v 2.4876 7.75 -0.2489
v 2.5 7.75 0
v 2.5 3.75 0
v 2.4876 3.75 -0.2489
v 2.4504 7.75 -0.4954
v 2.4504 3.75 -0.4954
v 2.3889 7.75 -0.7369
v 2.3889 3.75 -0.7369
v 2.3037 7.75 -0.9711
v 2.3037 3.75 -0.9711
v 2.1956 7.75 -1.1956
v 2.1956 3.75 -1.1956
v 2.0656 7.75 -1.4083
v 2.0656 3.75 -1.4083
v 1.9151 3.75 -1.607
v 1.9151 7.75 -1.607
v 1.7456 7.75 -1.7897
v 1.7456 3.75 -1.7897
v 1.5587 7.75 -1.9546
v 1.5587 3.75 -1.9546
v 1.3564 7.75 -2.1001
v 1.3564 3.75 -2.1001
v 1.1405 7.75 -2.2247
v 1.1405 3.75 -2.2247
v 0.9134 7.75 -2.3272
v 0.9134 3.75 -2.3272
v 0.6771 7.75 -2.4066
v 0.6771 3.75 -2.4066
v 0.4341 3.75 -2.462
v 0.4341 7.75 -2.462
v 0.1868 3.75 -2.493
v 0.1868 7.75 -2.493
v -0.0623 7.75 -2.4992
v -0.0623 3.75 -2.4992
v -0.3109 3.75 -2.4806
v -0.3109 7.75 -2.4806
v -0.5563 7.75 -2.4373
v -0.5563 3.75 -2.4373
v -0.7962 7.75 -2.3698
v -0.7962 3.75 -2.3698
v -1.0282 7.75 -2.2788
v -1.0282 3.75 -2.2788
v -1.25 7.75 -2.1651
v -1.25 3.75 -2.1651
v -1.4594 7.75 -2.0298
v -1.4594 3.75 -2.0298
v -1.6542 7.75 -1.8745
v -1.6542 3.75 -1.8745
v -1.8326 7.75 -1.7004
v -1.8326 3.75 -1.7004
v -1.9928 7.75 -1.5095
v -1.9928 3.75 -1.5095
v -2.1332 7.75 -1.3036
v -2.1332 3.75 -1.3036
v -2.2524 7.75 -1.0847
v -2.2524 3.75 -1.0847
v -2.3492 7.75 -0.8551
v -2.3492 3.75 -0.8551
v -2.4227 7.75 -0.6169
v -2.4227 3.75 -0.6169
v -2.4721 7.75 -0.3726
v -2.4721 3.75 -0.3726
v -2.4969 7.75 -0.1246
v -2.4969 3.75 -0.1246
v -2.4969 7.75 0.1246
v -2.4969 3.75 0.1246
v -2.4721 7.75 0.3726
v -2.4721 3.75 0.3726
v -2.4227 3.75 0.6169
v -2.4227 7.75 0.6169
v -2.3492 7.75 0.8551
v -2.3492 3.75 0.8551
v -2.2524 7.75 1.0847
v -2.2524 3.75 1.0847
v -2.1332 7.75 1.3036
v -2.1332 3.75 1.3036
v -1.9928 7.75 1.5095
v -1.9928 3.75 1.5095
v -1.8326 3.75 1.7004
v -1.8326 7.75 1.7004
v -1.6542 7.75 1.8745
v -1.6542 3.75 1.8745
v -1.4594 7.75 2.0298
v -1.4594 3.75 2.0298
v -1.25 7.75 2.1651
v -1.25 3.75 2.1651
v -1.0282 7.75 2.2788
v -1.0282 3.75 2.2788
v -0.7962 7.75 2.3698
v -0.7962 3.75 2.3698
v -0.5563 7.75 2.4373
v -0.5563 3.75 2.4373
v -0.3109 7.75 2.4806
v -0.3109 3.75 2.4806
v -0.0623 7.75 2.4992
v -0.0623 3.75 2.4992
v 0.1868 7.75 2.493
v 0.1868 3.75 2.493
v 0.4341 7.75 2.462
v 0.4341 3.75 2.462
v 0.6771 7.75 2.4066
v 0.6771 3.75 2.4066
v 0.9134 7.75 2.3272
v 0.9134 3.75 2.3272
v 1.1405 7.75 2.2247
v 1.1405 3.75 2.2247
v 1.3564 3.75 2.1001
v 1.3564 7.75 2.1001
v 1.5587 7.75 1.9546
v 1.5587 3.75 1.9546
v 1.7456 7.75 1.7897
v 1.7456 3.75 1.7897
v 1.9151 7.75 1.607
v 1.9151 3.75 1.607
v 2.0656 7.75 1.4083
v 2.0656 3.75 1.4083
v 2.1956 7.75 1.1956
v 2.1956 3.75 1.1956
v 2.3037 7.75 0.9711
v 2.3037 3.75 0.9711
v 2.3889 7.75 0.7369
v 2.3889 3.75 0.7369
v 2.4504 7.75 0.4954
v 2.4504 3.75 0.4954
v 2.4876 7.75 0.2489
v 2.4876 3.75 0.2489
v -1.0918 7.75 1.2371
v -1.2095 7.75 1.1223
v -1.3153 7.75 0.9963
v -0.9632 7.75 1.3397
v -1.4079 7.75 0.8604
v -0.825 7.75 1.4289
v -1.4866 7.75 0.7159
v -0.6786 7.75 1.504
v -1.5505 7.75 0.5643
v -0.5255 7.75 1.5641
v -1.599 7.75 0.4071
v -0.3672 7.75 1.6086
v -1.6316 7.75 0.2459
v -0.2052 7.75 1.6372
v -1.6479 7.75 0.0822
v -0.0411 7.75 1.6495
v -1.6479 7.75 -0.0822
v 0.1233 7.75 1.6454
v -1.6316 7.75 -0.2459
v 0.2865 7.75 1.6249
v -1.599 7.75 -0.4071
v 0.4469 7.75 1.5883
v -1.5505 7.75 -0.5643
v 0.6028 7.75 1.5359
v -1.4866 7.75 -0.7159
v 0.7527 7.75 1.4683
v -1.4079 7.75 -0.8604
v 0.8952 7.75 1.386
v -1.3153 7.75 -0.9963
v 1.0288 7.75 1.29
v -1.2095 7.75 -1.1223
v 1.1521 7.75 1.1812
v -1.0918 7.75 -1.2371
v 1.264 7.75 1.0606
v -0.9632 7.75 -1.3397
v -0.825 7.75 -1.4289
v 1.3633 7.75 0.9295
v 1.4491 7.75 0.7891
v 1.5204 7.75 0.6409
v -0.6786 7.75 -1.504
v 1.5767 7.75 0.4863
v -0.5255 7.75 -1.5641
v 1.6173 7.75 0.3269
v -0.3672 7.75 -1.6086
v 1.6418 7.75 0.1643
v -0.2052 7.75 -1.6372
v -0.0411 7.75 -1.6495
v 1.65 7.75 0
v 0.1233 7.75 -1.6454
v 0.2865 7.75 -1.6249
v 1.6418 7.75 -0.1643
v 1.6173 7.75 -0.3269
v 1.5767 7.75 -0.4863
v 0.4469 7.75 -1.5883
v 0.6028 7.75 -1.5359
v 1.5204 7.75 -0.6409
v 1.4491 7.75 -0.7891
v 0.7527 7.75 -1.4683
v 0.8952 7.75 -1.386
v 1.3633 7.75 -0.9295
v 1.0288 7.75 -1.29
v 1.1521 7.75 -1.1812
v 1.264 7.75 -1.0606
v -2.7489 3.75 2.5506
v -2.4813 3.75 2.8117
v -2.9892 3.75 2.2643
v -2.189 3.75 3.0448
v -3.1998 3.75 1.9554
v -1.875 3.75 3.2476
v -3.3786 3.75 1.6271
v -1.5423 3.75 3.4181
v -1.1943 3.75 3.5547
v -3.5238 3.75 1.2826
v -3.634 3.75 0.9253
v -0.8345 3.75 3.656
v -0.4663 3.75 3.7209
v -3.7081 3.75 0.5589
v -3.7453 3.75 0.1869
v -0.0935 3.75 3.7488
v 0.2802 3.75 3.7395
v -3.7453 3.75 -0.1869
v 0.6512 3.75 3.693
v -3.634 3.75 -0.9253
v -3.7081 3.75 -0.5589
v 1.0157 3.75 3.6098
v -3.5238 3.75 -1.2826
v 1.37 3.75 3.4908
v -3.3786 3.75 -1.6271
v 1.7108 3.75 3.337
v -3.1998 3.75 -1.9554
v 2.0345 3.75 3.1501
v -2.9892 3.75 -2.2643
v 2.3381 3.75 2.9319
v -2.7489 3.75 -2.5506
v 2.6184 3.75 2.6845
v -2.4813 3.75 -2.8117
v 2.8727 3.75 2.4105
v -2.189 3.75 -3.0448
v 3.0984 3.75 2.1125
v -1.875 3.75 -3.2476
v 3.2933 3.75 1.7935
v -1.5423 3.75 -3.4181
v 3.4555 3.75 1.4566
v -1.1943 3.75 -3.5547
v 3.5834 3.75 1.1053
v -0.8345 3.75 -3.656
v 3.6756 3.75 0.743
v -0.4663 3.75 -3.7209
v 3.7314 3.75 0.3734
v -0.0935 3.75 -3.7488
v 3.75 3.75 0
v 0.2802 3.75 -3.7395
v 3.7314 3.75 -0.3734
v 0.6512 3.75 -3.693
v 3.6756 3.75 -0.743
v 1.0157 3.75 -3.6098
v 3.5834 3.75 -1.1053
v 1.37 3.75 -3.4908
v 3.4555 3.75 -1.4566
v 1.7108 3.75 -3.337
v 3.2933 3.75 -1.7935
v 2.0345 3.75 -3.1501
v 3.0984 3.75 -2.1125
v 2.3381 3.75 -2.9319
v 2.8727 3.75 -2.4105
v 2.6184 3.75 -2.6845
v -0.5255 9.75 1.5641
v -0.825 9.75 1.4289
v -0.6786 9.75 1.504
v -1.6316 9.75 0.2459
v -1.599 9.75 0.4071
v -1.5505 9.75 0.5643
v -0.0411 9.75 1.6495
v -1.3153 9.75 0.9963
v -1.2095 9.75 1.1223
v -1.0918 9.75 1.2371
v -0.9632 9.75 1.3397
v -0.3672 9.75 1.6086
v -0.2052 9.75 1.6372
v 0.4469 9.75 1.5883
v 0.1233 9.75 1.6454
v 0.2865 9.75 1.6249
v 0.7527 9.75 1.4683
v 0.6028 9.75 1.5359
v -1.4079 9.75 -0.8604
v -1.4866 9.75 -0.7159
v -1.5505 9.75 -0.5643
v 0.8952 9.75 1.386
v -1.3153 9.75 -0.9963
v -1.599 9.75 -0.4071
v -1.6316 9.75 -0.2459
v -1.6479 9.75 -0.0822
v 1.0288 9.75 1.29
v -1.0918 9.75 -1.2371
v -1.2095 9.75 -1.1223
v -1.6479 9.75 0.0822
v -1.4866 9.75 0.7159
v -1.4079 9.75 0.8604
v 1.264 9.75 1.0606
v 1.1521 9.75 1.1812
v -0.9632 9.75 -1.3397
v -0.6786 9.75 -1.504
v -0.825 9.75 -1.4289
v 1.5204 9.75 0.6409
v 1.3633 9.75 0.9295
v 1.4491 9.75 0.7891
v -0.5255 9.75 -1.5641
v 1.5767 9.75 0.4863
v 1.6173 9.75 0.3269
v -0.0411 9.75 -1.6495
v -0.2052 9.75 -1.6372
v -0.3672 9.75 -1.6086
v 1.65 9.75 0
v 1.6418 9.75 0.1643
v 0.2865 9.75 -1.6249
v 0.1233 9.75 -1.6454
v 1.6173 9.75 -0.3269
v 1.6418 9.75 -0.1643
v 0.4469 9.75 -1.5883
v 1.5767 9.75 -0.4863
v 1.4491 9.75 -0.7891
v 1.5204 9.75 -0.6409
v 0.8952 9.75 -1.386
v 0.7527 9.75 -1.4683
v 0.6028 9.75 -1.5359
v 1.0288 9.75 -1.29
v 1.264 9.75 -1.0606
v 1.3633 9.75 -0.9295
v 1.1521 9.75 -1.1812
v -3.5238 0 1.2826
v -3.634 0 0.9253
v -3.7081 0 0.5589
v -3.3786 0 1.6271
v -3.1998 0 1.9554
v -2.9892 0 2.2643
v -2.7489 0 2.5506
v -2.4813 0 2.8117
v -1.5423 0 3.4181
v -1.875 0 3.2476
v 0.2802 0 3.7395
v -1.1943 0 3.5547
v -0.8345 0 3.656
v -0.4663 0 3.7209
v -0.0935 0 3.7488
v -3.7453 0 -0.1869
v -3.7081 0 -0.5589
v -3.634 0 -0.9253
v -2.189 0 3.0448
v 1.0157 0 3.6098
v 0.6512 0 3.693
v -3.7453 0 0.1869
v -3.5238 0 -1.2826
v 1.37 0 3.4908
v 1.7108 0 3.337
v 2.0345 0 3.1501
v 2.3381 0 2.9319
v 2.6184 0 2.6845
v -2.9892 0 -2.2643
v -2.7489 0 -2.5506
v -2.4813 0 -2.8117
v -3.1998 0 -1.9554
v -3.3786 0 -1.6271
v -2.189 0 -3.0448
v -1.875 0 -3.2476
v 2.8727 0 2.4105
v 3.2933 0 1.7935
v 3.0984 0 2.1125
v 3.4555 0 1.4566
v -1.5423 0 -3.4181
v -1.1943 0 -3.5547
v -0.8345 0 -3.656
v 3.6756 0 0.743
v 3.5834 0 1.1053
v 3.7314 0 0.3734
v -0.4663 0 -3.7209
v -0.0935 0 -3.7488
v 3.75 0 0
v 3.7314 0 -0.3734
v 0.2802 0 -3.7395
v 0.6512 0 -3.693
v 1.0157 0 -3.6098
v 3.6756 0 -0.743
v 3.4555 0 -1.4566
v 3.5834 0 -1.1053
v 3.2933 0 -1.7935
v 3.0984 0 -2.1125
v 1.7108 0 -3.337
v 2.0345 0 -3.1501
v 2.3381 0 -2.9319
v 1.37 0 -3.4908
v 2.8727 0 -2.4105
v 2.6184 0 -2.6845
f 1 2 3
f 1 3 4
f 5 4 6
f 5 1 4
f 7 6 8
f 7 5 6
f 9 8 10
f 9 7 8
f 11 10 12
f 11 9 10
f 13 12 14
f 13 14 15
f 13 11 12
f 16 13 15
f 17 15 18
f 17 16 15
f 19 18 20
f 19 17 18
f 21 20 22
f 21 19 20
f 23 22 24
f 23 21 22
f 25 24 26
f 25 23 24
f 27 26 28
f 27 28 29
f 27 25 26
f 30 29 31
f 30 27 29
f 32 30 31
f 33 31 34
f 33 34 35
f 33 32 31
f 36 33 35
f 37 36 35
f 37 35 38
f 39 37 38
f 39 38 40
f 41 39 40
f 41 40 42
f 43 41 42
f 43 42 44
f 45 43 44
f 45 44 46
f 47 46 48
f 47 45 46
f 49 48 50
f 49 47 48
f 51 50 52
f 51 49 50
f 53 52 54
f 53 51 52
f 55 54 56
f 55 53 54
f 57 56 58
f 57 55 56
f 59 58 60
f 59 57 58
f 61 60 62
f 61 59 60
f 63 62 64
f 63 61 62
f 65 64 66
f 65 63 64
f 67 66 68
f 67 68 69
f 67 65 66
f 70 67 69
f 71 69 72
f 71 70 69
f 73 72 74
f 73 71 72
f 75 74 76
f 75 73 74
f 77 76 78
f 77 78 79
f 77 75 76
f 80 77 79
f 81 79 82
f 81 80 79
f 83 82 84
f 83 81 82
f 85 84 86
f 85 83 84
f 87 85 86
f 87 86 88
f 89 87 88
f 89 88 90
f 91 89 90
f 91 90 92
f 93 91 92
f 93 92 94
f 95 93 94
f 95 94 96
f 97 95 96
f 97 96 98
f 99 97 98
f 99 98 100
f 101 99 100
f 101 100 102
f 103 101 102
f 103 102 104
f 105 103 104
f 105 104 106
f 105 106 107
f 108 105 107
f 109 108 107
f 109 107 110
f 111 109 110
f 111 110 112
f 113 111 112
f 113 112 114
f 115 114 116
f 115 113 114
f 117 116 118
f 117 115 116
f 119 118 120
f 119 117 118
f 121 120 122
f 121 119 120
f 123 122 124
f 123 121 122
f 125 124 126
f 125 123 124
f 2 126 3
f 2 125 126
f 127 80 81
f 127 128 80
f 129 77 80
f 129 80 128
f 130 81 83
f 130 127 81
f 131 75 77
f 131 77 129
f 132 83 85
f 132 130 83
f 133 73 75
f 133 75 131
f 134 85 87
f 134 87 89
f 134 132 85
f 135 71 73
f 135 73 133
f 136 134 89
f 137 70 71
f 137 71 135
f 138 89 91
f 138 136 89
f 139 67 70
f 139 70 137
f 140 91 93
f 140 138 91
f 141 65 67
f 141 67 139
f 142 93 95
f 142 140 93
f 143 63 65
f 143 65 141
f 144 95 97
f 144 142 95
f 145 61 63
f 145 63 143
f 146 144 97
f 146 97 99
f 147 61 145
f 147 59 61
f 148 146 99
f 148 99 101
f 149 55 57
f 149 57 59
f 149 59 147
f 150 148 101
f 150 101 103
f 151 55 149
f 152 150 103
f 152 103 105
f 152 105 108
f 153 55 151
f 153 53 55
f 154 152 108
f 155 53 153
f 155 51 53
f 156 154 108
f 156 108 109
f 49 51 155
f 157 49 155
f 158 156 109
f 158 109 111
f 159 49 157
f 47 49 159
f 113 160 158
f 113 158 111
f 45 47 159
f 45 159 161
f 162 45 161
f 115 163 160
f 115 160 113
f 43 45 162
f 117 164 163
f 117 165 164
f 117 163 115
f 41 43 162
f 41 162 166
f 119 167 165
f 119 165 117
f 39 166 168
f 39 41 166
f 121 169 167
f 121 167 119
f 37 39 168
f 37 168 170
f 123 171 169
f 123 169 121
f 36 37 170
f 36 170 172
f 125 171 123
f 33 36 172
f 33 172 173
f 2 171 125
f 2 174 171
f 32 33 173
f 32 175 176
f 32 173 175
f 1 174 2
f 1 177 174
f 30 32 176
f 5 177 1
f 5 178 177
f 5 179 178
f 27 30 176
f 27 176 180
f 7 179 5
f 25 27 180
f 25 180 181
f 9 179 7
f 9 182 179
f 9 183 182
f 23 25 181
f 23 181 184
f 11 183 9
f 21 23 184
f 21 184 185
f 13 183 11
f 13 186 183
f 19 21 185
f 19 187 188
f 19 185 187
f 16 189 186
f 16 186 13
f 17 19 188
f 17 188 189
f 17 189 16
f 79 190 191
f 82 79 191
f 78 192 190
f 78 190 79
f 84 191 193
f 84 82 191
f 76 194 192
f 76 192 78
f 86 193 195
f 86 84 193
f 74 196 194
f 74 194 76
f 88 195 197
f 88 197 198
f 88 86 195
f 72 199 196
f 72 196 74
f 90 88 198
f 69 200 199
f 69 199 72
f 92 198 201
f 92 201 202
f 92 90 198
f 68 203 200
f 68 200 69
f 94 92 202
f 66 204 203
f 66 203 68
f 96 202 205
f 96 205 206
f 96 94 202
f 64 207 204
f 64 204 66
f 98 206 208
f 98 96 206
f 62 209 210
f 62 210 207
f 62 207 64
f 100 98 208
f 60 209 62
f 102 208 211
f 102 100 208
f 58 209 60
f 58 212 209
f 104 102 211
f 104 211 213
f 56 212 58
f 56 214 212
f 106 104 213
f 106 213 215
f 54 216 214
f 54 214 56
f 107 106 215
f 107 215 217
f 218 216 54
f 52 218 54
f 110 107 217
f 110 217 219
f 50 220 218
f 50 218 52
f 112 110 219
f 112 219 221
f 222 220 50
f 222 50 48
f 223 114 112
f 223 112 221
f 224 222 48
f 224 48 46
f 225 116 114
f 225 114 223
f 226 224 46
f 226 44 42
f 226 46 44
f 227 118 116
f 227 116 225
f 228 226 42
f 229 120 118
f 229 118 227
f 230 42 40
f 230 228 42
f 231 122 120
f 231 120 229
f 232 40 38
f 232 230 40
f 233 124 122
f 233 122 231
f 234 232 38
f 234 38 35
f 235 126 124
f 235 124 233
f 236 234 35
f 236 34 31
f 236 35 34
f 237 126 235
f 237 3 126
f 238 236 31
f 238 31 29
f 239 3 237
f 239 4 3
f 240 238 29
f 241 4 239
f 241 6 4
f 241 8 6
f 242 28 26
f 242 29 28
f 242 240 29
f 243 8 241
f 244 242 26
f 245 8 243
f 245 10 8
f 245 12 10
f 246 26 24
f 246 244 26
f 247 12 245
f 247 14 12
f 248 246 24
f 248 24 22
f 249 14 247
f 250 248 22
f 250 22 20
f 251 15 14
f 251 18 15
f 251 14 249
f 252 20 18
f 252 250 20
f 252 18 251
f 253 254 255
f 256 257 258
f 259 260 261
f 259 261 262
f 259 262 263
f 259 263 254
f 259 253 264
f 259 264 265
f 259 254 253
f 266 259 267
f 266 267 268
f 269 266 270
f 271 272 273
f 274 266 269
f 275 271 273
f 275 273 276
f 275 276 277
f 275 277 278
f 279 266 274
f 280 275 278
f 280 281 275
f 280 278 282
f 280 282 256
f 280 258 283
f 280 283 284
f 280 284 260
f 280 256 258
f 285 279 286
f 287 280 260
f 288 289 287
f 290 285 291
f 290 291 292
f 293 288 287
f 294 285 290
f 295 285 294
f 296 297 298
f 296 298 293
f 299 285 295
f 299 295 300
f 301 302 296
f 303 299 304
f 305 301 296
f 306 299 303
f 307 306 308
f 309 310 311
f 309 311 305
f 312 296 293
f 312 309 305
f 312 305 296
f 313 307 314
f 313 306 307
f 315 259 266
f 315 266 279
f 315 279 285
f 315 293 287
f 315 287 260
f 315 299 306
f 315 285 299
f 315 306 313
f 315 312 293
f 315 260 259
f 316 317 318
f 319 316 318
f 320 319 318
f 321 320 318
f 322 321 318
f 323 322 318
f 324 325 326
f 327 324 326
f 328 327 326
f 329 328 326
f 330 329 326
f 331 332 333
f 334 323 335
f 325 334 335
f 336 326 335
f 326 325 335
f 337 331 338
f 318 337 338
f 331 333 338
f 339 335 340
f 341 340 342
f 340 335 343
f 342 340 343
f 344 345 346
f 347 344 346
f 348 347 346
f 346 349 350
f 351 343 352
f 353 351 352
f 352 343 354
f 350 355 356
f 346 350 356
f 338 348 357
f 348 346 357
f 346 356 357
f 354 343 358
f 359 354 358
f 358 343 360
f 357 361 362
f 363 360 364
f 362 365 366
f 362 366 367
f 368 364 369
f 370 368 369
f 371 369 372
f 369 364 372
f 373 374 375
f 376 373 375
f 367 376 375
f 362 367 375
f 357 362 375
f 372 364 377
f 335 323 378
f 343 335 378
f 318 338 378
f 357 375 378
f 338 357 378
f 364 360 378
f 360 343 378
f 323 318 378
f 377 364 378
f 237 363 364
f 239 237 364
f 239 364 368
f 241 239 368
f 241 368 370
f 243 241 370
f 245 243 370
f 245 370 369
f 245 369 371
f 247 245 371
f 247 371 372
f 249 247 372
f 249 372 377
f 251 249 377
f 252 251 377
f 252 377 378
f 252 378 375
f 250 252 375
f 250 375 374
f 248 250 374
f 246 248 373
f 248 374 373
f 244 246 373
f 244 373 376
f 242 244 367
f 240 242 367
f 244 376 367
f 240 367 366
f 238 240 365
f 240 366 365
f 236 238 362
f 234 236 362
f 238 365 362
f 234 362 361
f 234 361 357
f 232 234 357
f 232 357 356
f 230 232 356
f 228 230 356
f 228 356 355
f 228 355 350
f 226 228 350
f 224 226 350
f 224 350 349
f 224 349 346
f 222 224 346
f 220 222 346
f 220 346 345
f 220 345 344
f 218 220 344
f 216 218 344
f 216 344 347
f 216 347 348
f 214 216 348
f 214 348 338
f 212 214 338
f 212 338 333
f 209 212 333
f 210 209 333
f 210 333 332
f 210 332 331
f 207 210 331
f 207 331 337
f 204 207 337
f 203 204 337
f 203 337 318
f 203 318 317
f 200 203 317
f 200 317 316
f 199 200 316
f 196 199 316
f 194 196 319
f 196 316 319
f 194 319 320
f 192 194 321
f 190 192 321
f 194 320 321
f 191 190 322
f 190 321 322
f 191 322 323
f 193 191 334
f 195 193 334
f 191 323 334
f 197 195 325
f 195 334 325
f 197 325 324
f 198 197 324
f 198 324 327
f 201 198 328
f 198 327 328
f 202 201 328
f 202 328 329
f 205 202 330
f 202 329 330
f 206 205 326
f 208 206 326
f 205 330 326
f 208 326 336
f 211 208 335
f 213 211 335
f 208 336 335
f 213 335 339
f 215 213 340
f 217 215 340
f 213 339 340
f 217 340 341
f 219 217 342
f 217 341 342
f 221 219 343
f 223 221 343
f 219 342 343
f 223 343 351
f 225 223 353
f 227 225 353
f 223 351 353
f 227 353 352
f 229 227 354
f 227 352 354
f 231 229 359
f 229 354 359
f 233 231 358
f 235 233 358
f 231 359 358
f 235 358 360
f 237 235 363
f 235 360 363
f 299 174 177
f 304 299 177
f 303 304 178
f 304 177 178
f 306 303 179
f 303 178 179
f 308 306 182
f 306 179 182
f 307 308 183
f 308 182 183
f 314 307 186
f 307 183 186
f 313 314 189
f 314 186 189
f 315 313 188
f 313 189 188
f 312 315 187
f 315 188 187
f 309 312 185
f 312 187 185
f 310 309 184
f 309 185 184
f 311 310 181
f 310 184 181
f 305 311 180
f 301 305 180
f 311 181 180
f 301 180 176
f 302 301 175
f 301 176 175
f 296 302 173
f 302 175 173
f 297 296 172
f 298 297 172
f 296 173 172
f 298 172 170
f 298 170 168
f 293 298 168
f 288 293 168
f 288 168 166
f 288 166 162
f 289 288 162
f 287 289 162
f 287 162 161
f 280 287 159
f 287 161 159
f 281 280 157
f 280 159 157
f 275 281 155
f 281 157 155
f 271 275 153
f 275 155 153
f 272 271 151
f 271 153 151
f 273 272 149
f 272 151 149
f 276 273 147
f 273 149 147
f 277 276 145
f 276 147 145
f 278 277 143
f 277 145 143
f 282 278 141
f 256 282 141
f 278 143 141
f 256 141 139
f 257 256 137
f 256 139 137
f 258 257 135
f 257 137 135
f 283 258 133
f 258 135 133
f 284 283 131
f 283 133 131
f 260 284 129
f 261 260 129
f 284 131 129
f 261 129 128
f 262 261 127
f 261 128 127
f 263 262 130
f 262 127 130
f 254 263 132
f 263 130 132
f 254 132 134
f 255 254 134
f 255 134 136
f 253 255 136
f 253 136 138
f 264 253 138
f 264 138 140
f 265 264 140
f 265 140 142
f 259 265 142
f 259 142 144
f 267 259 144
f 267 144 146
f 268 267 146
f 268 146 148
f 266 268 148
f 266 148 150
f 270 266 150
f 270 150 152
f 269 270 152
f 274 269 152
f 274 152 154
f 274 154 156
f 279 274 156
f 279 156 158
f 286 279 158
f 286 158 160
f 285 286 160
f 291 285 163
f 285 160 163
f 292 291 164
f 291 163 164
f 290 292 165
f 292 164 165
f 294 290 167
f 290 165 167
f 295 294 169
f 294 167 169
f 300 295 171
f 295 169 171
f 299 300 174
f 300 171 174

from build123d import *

# Parameters (mm, degrees)
SKETCH1_R           = 3.75
BOSS_EXTRUDE1_DEPTH = 7.75
SKETCH2_R           = 3.75
SKETCH2_R_2         = 2.5
CUT_EXTRUDE1_DEPTH  = 4
SKETCH3_R           = 1.65
BOSS_EXTRUDE2_DEPTH = 2


with BuildPart() as part:
    # Sketch1 → Boss-Extrude1 (new body)
    with BuildSketch(Plane(origin=(0, 0, 0), x_dir=(1, 0, 0), z_dir=(0, 1, 0))):
        Circle(SKETCH1_R)
    extrude(amount=BOSS_EXTRUDE1_DEPTH)

    # Sketch2 → Cut-Extrude1 (cut)
    with BuildSketch(Plane(origin=(0, 7.75, 0), x_dir=(1, 0, 0), z_dir=(0, 1, 0))):
        Circle(SKETCH2_R)
        Circle(SKETCH2_R_2, mode=Mode.SUBTRACT)
    extrude(amount=-CUT_EXTRUDE1_DEPTH, mode=Mode.SUBTRACT)

    # Sketch3 → Boss-Extrude2 (add)
    with BuildSketch(Plane(origin=(0, 7.75, 0), x_dir=(1, 0, 0), z_dir=(0, 1, 0))):
        Circle(SKETCH3_R)
    extrude(amount=BOSS_EXTRUDE2_DEPTH)


solid = part.part
